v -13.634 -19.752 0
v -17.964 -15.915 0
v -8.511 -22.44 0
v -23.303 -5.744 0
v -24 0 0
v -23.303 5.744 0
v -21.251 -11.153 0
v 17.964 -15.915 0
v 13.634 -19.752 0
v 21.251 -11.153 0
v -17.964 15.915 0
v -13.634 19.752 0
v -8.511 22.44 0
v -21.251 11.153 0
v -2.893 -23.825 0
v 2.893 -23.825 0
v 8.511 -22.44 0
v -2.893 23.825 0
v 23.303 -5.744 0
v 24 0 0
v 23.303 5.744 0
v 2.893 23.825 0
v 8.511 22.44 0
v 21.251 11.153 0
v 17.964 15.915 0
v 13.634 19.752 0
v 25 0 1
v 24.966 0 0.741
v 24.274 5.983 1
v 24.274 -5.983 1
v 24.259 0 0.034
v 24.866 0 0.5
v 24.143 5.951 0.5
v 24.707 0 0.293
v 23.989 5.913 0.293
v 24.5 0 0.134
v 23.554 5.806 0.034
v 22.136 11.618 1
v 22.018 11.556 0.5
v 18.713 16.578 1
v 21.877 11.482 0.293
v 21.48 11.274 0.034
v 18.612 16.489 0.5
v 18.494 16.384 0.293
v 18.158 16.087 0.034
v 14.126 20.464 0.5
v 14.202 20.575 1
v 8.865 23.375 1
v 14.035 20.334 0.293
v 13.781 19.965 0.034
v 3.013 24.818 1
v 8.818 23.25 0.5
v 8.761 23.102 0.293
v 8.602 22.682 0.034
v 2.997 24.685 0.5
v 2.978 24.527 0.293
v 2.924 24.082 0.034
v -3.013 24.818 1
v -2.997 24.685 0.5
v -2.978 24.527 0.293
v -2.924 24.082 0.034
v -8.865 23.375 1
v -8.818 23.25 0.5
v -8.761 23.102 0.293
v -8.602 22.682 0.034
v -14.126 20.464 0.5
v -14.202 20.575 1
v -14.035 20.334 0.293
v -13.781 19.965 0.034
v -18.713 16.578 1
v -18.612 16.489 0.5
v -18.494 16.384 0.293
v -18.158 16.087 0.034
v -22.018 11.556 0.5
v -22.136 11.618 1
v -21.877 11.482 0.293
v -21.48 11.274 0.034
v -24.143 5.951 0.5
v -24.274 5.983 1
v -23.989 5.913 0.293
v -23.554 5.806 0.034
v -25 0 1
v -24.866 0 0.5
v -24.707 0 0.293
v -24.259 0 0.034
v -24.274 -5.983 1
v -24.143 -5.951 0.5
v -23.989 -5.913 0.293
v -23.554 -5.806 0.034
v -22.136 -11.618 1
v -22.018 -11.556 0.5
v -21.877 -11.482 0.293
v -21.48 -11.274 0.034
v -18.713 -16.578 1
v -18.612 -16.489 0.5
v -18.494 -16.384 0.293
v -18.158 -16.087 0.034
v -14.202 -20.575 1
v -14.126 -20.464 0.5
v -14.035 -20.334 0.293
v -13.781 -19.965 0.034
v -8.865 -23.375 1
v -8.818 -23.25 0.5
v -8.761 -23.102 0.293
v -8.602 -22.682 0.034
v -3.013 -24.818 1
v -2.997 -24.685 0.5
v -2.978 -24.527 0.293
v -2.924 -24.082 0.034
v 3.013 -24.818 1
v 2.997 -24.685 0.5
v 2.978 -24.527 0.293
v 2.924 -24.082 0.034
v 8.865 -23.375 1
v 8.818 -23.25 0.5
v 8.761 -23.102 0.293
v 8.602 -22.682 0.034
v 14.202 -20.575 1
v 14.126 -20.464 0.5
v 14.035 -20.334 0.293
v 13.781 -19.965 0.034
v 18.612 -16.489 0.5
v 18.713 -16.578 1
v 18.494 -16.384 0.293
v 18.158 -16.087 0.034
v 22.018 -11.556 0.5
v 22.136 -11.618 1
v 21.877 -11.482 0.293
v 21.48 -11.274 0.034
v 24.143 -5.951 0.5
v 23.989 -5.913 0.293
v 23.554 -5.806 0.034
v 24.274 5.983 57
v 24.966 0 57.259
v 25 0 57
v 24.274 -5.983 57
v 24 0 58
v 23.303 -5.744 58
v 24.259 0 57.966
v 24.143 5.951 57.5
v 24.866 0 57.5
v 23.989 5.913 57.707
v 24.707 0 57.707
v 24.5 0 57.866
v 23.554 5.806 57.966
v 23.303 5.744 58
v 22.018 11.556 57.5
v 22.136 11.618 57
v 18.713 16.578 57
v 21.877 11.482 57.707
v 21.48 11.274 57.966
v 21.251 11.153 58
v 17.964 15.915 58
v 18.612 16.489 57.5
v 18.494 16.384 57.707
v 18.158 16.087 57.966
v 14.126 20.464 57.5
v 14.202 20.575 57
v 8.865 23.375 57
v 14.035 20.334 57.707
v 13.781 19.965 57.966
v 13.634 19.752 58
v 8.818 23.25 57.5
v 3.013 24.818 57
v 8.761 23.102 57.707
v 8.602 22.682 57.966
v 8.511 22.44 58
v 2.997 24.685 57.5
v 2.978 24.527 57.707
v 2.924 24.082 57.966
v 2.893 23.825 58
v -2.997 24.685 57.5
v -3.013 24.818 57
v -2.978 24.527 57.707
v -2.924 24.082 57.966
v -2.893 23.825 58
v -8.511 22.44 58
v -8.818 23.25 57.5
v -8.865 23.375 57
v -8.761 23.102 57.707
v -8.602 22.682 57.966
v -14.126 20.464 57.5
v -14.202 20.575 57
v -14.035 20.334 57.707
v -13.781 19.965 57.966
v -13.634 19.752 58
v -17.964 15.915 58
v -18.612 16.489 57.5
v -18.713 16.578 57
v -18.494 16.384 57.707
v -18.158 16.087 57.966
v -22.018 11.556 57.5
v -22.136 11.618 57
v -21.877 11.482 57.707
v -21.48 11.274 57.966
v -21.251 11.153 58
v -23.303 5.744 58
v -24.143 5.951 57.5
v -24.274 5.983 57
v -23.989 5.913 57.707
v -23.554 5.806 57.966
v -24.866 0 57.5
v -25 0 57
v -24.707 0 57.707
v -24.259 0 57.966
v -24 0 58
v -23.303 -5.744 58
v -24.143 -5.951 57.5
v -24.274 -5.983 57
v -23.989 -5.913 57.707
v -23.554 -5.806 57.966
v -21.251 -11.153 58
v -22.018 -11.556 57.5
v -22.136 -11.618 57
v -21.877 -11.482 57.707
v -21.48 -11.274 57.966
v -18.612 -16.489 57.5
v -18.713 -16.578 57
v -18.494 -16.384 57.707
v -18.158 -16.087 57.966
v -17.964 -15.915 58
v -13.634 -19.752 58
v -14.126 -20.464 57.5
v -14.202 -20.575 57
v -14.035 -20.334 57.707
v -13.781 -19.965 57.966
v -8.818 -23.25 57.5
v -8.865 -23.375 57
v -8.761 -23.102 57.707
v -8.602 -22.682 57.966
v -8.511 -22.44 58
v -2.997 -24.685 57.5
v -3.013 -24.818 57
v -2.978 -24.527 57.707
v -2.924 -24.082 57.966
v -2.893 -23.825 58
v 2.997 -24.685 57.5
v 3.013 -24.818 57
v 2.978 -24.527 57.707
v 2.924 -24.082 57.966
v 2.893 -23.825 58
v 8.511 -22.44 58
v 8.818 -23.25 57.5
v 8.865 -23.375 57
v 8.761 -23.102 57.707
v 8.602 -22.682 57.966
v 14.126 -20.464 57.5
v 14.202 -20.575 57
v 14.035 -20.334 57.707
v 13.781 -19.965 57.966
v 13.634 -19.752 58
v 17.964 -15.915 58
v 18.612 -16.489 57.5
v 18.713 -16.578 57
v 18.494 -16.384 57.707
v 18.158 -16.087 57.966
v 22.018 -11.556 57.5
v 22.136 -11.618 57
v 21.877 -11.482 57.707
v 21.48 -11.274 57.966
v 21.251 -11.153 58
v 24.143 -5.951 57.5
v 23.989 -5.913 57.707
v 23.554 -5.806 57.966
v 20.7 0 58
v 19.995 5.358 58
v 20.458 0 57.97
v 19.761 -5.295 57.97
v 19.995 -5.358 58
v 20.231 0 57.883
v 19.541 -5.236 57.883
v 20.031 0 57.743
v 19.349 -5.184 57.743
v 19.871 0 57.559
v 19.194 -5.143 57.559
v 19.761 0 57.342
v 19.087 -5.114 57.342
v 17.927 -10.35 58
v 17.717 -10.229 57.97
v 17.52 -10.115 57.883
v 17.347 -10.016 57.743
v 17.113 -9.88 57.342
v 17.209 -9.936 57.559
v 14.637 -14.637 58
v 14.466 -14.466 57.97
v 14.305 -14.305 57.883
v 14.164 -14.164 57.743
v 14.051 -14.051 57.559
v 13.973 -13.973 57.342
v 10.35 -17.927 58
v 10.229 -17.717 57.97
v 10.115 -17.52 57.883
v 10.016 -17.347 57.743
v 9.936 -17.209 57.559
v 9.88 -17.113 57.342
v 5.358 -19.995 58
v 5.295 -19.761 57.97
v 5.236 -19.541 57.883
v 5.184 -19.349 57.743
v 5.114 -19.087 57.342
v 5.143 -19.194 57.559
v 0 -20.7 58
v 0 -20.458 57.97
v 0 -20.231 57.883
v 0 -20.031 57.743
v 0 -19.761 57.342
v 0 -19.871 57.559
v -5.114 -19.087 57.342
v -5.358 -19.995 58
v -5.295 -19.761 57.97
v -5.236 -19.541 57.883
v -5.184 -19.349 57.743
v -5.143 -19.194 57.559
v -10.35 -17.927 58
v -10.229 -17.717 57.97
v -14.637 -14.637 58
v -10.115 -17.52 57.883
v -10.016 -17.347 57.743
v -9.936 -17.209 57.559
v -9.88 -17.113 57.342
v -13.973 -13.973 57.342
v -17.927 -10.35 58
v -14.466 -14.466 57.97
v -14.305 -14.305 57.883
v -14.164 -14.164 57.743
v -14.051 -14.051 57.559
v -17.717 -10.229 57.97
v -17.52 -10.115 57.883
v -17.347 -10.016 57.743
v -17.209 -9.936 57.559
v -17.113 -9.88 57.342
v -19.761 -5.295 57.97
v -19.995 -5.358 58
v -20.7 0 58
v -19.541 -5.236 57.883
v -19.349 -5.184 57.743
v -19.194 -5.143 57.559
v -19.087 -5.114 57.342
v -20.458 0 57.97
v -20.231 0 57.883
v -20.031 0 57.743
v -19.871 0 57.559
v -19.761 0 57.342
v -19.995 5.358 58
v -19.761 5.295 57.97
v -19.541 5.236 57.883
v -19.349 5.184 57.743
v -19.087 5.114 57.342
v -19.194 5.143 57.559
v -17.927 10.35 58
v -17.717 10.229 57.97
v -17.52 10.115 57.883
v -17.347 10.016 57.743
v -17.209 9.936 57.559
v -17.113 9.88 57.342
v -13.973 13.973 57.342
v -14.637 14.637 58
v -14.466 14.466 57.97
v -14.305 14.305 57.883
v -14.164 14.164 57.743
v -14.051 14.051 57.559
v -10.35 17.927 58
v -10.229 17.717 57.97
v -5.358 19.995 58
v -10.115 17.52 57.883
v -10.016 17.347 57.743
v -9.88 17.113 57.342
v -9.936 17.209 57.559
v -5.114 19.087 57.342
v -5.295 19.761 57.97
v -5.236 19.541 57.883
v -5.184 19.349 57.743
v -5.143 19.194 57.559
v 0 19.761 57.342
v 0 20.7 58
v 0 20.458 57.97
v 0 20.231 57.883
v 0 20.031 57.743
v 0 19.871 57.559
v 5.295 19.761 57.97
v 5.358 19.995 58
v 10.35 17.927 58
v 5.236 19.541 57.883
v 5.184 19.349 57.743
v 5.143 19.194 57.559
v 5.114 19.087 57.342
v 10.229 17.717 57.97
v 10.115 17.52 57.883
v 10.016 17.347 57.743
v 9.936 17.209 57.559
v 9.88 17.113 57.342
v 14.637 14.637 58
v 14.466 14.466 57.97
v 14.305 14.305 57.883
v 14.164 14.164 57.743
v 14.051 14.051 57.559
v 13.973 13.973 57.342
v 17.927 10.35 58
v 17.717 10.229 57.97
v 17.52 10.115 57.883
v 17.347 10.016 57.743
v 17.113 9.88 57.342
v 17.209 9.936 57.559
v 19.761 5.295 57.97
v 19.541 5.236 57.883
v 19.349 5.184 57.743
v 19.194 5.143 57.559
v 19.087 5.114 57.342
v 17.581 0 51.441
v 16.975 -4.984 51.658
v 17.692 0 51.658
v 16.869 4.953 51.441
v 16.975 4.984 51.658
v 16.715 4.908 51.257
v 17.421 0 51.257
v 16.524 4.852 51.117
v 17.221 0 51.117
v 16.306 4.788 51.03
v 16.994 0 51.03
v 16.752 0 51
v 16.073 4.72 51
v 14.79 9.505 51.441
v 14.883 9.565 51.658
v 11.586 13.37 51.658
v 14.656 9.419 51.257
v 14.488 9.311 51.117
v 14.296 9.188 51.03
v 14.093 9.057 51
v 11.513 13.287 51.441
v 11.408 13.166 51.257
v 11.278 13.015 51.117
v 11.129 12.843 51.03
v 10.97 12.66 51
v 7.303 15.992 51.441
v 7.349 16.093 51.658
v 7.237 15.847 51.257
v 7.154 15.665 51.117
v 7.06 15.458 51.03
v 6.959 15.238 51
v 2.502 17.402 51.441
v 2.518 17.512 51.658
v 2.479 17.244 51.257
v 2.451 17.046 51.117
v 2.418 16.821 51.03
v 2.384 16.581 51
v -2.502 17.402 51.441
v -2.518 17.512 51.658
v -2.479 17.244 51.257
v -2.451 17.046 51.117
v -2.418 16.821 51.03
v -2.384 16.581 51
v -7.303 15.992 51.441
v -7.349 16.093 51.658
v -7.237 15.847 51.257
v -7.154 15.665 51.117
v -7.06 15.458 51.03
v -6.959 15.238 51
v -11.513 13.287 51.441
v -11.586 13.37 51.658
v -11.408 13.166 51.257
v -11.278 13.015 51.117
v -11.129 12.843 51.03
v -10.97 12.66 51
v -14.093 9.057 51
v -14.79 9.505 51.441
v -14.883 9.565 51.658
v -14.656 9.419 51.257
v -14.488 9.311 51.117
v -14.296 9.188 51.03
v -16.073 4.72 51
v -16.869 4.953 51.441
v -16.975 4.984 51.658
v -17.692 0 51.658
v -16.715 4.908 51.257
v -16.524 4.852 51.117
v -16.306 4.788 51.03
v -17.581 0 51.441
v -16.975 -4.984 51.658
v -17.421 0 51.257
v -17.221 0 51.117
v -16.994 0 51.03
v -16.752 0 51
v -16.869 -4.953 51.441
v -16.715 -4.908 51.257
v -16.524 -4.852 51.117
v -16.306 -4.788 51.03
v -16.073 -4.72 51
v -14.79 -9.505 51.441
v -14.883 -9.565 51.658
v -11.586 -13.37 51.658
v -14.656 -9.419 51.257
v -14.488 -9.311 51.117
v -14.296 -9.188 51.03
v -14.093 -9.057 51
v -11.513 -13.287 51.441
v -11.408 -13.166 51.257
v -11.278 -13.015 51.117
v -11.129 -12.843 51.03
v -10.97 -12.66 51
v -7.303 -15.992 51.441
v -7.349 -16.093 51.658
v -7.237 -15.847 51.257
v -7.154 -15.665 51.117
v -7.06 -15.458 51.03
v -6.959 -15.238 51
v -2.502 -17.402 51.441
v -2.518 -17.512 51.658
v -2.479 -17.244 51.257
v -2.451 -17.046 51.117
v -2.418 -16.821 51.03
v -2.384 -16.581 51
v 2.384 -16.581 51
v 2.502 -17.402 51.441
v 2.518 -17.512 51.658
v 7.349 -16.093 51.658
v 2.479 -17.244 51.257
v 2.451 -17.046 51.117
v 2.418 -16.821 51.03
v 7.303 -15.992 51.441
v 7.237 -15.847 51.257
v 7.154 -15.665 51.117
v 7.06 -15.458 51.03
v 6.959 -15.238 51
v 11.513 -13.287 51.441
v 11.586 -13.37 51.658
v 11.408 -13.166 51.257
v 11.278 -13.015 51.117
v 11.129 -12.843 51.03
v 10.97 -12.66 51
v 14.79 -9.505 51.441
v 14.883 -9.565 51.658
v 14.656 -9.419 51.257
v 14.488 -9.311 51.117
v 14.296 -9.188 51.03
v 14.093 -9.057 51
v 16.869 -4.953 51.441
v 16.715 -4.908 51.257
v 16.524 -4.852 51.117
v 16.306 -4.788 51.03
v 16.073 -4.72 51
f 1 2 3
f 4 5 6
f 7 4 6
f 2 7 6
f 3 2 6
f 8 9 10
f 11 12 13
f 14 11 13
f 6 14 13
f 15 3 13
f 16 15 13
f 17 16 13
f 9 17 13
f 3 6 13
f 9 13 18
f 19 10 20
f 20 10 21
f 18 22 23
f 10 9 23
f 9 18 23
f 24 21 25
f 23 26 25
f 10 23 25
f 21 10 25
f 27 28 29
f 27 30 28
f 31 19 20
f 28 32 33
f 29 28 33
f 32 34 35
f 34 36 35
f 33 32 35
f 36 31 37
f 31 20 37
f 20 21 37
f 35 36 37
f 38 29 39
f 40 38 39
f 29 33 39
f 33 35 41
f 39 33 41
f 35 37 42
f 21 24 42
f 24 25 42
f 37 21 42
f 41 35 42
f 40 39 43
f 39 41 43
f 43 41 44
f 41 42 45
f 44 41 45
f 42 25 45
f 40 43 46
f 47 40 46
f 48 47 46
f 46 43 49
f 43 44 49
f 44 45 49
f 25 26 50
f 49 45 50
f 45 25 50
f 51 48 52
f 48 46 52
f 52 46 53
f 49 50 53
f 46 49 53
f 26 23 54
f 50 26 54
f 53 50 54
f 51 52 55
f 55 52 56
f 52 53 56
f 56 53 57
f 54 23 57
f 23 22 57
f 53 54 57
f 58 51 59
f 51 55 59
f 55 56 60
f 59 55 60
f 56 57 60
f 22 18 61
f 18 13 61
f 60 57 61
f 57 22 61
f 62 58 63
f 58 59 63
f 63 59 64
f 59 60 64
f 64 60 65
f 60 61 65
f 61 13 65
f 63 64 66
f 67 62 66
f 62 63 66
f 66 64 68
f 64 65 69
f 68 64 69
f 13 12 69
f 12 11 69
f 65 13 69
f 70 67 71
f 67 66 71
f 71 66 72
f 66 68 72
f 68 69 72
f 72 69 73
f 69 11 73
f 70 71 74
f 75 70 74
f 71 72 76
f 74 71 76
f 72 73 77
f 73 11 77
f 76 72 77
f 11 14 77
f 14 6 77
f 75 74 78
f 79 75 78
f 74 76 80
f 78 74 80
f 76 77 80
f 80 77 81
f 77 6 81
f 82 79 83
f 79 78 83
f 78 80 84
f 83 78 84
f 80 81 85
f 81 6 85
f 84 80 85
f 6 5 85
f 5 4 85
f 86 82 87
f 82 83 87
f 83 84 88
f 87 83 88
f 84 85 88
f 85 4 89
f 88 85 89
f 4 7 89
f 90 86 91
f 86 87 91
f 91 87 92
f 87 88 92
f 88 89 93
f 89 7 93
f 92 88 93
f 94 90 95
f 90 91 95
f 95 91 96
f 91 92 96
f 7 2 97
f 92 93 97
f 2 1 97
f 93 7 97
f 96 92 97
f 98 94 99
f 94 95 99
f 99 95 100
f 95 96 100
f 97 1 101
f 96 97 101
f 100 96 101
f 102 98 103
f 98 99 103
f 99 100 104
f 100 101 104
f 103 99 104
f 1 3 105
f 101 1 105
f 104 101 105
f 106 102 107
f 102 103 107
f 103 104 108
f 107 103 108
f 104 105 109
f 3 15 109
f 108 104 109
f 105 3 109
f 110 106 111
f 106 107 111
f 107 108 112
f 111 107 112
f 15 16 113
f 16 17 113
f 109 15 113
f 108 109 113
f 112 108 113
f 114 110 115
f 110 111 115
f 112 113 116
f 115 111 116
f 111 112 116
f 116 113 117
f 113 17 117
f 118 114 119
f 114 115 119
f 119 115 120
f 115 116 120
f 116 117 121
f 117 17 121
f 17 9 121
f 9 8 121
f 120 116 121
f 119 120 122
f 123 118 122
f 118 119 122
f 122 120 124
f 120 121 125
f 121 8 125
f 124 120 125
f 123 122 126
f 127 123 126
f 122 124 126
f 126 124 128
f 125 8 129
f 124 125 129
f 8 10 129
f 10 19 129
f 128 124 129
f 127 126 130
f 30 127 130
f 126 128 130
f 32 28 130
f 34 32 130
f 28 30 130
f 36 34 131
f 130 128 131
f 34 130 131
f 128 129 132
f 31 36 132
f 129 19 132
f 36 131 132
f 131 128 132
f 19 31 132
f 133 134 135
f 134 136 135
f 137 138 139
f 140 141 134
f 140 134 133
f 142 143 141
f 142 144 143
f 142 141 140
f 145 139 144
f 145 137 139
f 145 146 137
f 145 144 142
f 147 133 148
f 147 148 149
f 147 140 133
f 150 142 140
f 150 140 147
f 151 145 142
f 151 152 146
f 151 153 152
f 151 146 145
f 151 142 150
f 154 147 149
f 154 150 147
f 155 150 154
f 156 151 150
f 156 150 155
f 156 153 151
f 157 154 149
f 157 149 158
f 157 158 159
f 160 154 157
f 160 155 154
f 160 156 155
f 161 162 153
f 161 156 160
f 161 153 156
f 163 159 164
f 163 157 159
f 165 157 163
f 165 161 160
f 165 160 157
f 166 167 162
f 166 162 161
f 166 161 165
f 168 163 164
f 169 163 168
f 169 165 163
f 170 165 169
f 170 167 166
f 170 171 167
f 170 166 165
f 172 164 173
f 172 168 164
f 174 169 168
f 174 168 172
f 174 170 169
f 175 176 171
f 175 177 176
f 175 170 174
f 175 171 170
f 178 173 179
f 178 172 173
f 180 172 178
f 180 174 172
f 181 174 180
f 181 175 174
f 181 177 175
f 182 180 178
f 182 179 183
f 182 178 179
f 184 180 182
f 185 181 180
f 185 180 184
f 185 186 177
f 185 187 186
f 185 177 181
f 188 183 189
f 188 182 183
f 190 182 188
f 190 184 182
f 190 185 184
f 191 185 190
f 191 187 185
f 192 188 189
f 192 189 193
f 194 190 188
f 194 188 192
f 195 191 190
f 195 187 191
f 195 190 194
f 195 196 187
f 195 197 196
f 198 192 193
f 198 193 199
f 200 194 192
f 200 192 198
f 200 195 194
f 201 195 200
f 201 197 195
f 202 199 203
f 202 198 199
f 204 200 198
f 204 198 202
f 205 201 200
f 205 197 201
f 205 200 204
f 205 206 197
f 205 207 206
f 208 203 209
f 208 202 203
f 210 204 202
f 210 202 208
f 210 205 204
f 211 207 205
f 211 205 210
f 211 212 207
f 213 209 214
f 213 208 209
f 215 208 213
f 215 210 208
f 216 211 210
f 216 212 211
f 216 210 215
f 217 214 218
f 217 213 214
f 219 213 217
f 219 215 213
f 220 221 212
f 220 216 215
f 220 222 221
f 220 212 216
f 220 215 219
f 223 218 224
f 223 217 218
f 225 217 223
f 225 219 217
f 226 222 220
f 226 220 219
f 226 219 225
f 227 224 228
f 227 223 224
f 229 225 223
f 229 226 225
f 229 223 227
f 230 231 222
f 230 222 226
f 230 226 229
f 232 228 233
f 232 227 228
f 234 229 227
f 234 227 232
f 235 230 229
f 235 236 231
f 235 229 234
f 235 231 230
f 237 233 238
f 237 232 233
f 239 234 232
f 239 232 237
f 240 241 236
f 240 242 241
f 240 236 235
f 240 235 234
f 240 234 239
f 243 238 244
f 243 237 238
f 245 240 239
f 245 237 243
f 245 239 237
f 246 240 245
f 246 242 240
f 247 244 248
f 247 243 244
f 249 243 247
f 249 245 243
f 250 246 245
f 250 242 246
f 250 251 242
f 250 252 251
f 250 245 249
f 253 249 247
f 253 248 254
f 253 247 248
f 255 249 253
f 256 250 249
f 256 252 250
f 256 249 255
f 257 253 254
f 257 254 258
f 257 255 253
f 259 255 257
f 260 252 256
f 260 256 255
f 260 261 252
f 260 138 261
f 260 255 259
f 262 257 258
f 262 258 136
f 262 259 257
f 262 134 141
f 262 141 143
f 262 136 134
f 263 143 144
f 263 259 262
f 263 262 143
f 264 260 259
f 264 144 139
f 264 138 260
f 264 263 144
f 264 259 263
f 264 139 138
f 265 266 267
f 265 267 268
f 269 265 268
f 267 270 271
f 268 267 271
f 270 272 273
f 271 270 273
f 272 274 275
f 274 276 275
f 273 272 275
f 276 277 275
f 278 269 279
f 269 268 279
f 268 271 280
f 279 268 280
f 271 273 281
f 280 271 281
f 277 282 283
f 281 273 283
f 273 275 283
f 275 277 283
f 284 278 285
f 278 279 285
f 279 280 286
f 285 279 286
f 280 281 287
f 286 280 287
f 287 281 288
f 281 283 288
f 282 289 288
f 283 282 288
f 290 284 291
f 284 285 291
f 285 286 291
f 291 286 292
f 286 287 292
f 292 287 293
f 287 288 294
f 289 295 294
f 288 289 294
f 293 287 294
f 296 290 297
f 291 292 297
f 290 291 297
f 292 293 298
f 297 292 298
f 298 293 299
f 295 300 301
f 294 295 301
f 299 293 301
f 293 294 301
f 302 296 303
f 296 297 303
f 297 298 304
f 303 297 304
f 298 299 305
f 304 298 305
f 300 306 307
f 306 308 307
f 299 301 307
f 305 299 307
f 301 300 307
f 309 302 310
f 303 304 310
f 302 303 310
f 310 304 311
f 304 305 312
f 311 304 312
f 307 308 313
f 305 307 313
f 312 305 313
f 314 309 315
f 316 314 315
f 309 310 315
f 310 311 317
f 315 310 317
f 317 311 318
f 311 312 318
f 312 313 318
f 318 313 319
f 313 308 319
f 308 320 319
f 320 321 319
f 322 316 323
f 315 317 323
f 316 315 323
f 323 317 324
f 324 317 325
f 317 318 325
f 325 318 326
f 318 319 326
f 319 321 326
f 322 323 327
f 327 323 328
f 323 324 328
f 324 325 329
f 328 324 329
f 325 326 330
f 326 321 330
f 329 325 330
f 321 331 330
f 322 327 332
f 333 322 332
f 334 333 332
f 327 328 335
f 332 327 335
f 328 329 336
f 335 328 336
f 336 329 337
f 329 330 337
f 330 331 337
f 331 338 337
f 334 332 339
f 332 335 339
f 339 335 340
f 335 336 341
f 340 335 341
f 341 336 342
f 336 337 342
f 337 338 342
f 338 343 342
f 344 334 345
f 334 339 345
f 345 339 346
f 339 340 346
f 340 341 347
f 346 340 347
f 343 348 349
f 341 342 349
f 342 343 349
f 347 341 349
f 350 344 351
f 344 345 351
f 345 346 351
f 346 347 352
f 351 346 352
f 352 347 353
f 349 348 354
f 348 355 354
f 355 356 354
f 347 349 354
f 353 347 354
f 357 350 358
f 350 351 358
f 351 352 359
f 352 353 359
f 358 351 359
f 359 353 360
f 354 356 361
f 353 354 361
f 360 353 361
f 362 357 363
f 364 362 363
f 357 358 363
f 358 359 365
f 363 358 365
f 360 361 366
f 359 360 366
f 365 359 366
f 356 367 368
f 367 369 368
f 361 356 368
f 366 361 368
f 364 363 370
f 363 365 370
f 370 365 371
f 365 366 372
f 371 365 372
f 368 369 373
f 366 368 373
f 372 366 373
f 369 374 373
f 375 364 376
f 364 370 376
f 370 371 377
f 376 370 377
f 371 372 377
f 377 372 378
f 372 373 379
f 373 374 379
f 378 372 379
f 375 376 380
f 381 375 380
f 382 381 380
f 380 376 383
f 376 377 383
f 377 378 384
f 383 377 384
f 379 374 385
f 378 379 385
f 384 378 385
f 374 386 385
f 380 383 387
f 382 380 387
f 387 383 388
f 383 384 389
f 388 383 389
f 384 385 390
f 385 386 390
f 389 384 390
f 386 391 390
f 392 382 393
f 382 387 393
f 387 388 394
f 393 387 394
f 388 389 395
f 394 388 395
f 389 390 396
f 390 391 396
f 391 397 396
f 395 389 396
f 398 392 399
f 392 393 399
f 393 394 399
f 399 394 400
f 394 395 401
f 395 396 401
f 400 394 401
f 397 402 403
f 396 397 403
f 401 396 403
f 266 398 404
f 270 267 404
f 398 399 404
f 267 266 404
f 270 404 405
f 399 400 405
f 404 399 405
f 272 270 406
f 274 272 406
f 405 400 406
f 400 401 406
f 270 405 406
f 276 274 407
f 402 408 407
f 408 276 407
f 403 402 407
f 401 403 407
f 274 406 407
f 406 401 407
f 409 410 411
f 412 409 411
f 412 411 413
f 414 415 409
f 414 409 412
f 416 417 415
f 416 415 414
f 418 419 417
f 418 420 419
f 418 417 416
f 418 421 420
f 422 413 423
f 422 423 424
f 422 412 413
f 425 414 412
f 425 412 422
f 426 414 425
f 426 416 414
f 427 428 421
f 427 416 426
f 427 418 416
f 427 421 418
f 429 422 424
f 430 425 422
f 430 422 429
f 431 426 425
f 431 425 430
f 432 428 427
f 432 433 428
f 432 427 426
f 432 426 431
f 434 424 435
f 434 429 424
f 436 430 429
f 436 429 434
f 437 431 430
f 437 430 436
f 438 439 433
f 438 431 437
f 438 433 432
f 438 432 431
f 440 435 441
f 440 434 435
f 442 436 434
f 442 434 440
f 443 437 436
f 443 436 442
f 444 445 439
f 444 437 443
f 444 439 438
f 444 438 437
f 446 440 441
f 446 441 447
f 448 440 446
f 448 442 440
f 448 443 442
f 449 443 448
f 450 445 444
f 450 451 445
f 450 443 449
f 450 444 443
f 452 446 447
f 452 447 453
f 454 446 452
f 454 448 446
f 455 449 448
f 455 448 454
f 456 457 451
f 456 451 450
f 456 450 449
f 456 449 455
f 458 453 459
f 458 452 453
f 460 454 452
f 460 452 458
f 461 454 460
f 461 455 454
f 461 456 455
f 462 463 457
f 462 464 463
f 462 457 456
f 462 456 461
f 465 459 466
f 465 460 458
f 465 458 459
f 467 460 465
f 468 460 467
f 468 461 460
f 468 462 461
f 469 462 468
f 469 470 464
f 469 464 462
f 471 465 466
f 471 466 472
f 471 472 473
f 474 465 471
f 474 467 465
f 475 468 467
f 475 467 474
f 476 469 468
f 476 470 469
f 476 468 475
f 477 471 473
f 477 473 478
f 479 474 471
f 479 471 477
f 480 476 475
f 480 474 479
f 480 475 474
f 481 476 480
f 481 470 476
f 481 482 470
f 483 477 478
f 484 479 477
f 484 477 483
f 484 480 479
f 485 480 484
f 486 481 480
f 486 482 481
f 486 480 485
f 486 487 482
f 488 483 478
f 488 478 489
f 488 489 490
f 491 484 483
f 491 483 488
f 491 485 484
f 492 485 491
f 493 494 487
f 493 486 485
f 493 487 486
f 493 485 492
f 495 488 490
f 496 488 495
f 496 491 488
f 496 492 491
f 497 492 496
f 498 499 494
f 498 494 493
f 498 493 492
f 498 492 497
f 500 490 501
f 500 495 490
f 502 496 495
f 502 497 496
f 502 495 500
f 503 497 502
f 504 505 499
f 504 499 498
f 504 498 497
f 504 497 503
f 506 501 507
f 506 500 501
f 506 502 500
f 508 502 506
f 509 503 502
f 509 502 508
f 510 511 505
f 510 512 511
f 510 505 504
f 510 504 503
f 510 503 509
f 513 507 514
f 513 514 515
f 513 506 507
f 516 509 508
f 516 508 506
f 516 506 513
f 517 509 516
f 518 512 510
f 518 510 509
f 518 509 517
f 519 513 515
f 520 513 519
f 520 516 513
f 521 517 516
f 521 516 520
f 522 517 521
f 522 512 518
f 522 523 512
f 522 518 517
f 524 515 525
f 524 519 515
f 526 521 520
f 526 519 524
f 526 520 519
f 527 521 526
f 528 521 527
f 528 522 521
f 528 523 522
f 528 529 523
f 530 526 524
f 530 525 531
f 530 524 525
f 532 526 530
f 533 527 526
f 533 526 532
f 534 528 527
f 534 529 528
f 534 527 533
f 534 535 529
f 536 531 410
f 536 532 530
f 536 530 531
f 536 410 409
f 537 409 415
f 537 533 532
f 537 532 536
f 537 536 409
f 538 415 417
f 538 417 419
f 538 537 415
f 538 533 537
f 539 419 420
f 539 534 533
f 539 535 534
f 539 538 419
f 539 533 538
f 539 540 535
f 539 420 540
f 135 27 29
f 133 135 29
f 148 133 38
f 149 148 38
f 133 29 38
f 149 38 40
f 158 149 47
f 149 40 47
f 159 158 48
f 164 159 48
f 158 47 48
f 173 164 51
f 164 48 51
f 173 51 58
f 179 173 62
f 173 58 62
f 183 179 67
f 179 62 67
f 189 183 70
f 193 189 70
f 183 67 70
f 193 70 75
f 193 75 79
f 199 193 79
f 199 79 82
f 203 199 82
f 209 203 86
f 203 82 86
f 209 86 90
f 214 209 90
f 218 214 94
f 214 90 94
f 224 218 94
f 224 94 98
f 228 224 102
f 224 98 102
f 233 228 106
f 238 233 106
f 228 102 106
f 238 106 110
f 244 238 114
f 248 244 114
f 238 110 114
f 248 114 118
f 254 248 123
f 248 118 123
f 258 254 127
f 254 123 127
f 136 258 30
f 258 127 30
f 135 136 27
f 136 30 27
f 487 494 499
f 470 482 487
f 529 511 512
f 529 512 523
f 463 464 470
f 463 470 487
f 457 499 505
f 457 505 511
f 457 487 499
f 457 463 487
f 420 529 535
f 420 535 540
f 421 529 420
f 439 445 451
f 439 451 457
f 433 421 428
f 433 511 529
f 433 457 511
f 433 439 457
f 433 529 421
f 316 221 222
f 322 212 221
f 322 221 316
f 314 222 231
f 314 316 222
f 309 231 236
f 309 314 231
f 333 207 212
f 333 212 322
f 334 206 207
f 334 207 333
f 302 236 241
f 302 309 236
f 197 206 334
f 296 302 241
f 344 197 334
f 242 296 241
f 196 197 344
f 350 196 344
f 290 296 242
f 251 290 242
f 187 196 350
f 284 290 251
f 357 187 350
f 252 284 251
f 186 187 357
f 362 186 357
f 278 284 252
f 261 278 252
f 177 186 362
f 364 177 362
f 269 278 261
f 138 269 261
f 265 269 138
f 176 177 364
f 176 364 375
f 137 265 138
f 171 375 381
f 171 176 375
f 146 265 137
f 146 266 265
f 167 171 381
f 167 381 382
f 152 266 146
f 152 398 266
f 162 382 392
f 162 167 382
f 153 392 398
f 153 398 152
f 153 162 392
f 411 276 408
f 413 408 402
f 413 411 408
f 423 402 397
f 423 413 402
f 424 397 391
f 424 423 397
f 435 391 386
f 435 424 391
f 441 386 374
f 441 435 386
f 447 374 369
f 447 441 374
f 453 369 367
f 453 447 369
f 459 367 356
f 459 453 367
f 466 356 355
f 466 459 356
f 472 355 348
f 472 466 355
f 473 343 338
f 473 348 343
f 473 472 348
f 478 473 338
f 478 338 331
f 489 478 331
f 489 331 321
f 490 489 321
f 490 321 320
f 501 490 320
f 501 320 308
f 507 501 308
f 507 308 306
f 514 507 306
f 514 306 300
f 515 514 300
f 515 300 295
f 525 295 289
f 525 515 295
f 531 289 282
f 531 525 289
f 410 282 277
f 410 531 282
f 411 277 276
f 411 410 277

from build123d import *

# Parameters (mm, degrees)
SKETCH_R     = 25
PAD_DEPTH    = 58
SKETCH001_R  = 20
POCKET_DEPTH = 7
POCKET_TAPER = 20
FILLET_R     = 1


with BuildPart() as part:
    # Sketch → Pad (new body)
    with BuildSketch(Plane.XY):
        Circle(SKETCH_R)
    extrude(amount=PAD_DEPTH)

    # Sketch001 → Pocket (cut)
    with BuildSketch(Plane.XY.offset(58)):
        Circle(SKETCH001_R)
    extrude(amount=-POCKET_DEPTH, taper=POCKET_TAPER, mode=Mode.SUBTRACT)

    # Fillet
    fillet_edges = [part.edges().sort_by_distance(p)[0] for p in [
        (-25, 0, 58),
        (-25, 0, 0),
        (-20, 0, 58),
        (-17.452208, 0, 51),
    ]]
    fillet(fillet_edges, radius=FILLET_R)


solid = part.part
